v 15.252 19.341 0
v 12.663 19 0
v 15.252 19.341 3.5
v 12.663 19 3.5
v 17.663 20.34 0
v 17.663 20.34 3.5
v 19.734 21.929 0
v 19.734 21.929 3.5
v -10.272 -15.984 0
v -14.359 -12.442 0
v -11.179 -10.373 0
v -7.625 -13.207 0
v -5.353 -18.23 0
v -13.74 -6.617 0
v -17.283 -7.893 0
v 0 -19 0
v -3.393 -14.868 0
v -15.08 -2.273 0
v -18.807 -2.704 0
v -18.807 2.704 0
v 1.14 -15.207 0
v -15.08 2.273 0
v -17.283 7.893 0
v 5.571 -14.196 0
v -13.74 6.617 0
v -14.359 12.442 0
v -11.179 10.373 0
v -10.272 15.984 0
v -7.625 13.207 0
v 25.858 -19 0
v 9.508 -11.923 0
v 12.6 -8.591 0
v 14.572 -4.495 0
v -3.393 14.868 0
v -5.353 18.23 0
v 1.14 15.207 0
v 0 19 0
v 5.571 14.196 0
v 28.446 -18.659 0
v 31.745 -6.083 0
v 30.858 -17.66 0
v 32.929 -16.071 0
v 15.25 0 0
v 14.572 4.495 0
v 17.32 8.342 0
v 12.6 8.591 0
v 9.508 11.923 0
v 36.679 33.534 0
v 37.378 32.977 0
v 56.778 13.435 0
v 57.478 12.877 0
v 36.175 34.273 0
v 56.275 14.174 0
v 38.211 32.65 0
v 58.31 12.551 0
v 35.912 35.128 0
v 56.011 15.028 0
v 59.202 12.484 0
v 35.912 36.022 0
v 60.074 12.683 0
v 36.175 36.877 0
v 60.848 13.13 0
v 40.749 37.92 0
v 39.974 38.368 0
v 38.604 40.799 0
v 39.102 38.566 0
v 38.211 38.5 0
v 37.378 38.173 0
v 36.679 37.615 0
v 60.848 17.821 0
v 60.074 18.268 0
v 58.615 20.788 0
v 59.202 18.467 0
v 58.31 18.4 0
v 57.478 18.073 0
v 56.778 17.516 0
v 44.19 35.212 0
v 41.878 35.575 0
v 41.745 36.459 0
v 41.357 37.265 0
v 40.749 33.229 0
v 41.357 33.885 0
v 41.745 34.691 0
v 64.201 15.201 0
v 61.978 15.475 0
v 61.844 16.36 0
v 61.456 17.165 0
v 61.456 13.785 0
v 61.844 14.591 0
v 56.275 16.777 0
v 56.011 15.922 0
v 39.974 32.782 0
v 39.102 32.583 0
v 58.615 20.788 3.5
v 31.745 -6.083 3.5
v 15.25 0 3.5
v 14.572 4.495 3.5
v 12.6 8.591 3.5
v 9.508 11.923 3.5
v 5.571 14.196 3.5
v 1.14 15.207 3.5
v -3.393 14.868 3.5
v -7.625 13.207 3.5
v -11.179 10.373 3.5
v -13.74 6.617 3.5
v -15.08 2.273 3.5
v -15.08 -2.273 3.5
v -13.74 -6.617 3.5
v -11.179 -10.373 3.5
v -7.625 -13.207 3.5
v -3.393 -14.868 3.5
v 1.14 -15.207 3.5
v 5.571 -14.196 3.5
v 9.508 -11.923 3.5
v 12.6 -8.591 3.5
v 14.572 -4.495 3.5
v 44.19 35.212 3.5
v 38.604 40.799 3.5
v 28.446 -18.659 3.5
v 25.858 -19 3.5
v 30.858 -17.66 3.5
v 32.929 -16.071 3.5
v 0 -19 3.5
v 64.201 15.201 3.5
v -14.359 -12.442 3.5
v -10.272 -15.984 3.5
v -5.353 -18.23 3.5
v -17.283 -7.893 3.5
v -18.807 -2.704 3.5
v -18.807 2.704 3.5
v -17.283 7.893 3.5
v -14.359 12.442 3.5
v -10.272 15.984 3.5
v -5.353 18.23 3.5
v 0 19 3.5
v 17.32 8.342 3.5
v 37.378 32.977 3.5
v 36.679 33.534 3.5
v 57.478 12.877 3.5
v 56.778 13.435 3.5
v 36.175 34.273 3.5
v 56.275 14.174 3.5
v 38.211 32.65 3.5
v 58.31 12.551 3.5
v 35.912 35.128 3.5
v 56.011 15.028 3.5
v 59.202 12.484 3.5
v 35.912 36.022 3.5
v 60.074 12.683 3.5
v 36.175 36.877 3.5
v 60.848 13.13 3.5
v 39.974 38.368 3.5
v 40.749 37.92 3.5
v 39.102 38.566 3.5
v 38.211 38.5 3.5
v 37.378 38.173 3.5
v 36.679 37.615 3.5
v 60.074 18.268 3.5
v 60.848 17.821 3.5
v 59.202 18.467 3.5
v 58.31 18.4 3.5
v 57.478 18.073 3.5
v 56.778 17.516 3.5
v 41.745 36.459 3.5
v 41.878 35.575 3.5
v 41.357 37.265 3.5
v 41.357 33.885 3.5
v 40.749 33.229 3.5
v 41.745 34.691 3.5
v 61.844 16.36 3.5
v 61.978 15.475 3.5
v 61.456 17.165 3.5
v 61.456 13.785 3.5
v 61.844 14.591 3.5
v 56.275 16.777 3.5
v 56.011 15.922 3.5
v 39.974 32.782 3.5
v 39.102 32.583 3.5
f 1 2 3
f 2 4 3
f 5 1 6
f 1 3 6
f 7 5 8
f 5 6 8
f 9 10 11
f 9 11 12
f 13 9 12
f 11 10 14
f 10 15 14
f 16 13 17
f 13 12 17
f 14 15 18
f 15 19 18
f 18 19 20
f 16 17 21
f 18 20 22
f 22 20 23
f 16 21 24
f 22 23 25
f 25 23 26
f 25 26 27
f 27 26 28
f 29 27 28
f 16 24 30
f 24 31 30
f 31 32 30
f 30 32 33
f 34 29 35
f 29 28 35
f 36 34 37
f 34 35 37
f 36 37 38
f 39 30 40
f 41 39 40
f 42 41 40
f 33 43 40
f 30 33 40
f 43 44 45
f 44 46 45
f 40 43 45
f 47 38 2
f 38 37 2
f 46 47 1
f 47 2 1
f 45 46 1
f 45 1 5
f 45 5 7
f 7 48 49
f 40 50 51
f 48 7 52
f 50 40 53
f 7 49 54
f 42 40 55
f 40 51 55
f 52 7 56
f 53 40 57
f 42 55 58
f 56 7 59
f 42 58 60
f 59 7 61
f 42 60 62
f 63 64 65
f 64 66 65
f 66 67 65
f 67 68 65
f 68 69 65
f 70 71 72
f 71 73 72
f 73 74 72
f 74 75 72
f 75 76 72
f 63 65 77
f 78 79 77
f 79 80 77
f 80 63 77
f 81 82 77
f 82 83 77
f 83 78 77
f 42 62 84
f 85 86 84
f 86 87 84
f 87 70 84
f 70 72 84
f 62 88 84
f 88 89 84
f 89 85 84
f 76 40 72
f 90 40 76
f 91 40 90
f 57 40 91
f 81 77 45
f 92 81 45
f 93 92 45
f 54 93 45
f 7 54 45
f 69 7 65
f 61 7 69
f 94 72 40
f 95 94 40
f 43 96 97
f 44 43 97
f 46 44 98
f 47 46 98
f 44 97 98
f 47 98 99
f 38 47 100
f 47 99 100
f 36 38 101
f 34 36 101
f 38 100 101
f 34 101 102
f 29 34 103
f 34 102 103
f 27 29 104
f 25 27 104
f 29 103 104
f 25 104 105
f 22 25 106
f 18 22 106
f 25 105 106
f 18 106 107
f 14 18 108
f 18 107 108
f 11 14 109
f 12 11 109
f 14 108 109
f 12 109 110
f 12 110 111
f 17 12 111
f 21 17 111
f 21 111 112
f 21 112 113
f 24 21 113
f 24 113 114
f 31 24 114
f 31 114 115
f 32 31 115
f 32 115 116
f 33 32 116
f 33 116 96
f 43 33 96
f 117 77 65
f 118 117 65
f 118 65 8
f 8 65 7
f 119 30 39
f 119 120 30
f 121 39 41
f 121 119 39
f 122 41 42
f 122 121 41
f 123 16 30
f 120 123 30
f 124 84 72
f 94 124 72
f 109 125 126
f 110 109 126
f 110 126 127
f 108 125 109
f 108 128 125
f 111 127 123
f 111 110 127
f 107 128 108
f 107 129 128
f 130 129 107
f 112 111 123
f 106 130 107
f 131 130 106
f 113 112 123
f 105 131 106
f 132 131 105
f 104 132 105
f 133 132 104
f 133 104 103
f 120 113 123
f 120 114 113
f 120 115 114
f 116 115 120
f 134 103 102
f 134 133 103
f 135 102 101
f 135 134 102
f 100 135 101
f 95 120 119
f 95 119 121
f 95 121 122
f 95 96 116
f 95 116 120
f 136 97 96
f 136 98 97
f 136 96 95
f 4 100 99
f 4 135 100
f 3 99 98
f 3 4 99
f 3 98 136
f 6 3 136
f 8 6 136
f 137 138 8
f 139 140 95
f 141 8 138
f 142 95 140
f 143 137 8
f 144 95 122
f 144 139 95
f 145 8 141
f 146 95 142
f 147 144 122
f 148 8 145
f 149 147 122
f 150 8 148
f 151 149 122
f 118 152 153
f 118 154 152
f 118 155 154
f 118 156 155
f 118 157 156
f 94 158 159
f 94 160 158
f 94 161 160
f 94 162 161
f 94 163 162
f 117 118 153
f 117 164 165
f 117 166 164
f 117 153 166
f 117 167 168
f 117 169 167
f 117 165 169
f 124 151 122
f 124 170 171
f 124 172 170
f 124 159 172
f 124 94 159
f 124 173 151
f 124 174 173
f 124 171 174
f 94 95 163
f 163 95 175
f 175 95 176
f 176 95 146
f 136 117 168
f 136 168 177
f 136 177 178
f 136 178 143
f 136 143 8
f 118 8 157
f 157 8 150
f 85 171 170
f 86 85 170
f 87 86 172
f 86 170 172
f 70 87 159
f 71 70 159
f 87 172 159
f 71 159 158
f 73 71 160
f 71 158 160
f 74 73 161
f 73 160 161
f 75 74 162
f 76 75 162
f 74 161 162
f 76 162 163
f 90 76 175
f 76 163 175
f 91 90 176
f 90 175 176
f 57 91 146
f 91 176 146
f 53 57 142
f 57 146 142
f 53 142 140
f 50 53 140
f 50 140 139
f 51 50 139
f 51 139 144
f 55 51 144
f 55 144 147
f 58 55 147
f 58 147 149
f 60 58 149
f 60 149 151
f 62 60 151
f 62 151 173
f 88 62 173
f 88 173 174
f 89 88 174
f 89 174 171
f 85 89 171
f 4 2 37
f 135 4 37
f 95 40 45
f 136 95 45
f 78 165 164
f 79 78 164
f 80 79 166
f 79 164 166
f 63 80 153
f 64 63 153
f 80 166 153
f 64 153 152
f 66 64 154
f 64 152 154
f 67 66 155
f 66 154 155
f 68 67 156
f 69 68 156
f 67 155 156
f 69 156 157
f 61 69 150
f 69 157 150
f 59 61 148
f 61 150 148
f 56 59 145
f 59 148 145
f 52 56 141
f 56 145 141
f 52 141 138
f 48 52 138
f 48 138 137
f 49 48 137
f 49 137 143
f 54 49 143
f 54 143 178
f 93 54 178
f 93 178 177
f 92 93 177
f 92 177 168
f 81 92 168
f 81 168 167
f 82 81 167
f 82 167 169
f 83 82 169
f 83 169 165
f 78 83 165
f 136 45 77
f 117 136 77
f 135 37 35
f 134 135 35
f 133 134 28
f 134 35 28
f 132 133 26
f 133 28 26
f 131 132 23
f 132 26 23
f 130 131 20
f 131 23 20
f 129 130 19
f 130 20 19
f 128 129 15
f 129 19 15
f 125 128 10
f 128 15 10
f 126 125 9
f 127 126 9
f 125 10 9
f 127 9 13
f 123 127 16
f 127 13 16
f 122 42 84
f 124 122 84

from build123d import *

# Parameters (mm, degrees)
SKETCH1_R           = 2.5
BOSS_EXTRUDE1_DEPTH = 3.5
SKETCH2_R           = 1.5
CUT_EXTRUDE1_DEPTH  = 77.148499601
FILLET1_R           = 10
SKETCH5_R           = 15.25
SKETCH5_R_2         = 3
CUT_EXTRUDE4_DEPTH  = 77.148499601


with BuildPart() as part:
    # Sketch1 → Boss-Extrude1 (new body)
    with BuildSketch(Plane.XY):
        with BuildLine():
            Line((0, -19), (30, -19))
            Line((30, -19), (64.201367261, 15.201367261))
            Line((64.201367261, 15.201367261), (58.615223689, 20.787510832))
            Line((58.615223689, 20.787510832), (31.745166004, -6.082546853))
            Line((31.745166004, -6.082546853), (17.320187668, 8.342431483))
            Line((17.320187668, 8.342431483), (44.190245353, 35.212489168))
            Line((44.190245353, 35.212489168), (38.604101782, 40.798632739))
            Line((38.604101782, 40.798632739), (16.805469042, 19))
            Line((16.805469042, 19), (0, 19))
            ThreePointArc((0, 19), (-19, 0), (0, -19))
        make_face()
        Circle(SKETCH1_R, mode=Mode.SUBTRACT)
    extrude(amount=BOSS_EXTRUDE1_DEPTH)

    # Sketch2 → Cut-Extrude1 (cut, through all)
    with BuildSketch(Plane.XY.offset(3.5)):
        with Locations((38.878105659, 35.574881393)):
            Circle(SKETCH2_R)
        with Locations((58.977615915, 15.475371138)):
            Circle(SKETCH2_R)
    extrude(amount=-CUT_EXTRUDE1_DEPTH, mode=Mode.SUBTRACT)

    # Fillet1
    fillet1_edges = [part.edges().sort_by_distance(p)[0] for p in [
        (30, -19, 1.75),
        (16.805469042, 19, 1.75),
    ]]
    fillet(fillet1_edges, radius=FILLET1_R)

    # Sketch5 → Cut-Extrude4 (cut, through all)
    with BuildSketch(Plane.XY.offset(3.5)):
        Circle(SKETCH5_R)
        with Locations((38.878105659, 35.574881393)):
            Circle(SKETCH5_R_2)
        with Locations((58.977615915, 15.475371138)):
            Circle(SKETCH5_R_2)
    extrude(amount=-CUT_EXTRUDE4_DEPTH, mode=Mode.SUBTRACT)


solid = part.part
